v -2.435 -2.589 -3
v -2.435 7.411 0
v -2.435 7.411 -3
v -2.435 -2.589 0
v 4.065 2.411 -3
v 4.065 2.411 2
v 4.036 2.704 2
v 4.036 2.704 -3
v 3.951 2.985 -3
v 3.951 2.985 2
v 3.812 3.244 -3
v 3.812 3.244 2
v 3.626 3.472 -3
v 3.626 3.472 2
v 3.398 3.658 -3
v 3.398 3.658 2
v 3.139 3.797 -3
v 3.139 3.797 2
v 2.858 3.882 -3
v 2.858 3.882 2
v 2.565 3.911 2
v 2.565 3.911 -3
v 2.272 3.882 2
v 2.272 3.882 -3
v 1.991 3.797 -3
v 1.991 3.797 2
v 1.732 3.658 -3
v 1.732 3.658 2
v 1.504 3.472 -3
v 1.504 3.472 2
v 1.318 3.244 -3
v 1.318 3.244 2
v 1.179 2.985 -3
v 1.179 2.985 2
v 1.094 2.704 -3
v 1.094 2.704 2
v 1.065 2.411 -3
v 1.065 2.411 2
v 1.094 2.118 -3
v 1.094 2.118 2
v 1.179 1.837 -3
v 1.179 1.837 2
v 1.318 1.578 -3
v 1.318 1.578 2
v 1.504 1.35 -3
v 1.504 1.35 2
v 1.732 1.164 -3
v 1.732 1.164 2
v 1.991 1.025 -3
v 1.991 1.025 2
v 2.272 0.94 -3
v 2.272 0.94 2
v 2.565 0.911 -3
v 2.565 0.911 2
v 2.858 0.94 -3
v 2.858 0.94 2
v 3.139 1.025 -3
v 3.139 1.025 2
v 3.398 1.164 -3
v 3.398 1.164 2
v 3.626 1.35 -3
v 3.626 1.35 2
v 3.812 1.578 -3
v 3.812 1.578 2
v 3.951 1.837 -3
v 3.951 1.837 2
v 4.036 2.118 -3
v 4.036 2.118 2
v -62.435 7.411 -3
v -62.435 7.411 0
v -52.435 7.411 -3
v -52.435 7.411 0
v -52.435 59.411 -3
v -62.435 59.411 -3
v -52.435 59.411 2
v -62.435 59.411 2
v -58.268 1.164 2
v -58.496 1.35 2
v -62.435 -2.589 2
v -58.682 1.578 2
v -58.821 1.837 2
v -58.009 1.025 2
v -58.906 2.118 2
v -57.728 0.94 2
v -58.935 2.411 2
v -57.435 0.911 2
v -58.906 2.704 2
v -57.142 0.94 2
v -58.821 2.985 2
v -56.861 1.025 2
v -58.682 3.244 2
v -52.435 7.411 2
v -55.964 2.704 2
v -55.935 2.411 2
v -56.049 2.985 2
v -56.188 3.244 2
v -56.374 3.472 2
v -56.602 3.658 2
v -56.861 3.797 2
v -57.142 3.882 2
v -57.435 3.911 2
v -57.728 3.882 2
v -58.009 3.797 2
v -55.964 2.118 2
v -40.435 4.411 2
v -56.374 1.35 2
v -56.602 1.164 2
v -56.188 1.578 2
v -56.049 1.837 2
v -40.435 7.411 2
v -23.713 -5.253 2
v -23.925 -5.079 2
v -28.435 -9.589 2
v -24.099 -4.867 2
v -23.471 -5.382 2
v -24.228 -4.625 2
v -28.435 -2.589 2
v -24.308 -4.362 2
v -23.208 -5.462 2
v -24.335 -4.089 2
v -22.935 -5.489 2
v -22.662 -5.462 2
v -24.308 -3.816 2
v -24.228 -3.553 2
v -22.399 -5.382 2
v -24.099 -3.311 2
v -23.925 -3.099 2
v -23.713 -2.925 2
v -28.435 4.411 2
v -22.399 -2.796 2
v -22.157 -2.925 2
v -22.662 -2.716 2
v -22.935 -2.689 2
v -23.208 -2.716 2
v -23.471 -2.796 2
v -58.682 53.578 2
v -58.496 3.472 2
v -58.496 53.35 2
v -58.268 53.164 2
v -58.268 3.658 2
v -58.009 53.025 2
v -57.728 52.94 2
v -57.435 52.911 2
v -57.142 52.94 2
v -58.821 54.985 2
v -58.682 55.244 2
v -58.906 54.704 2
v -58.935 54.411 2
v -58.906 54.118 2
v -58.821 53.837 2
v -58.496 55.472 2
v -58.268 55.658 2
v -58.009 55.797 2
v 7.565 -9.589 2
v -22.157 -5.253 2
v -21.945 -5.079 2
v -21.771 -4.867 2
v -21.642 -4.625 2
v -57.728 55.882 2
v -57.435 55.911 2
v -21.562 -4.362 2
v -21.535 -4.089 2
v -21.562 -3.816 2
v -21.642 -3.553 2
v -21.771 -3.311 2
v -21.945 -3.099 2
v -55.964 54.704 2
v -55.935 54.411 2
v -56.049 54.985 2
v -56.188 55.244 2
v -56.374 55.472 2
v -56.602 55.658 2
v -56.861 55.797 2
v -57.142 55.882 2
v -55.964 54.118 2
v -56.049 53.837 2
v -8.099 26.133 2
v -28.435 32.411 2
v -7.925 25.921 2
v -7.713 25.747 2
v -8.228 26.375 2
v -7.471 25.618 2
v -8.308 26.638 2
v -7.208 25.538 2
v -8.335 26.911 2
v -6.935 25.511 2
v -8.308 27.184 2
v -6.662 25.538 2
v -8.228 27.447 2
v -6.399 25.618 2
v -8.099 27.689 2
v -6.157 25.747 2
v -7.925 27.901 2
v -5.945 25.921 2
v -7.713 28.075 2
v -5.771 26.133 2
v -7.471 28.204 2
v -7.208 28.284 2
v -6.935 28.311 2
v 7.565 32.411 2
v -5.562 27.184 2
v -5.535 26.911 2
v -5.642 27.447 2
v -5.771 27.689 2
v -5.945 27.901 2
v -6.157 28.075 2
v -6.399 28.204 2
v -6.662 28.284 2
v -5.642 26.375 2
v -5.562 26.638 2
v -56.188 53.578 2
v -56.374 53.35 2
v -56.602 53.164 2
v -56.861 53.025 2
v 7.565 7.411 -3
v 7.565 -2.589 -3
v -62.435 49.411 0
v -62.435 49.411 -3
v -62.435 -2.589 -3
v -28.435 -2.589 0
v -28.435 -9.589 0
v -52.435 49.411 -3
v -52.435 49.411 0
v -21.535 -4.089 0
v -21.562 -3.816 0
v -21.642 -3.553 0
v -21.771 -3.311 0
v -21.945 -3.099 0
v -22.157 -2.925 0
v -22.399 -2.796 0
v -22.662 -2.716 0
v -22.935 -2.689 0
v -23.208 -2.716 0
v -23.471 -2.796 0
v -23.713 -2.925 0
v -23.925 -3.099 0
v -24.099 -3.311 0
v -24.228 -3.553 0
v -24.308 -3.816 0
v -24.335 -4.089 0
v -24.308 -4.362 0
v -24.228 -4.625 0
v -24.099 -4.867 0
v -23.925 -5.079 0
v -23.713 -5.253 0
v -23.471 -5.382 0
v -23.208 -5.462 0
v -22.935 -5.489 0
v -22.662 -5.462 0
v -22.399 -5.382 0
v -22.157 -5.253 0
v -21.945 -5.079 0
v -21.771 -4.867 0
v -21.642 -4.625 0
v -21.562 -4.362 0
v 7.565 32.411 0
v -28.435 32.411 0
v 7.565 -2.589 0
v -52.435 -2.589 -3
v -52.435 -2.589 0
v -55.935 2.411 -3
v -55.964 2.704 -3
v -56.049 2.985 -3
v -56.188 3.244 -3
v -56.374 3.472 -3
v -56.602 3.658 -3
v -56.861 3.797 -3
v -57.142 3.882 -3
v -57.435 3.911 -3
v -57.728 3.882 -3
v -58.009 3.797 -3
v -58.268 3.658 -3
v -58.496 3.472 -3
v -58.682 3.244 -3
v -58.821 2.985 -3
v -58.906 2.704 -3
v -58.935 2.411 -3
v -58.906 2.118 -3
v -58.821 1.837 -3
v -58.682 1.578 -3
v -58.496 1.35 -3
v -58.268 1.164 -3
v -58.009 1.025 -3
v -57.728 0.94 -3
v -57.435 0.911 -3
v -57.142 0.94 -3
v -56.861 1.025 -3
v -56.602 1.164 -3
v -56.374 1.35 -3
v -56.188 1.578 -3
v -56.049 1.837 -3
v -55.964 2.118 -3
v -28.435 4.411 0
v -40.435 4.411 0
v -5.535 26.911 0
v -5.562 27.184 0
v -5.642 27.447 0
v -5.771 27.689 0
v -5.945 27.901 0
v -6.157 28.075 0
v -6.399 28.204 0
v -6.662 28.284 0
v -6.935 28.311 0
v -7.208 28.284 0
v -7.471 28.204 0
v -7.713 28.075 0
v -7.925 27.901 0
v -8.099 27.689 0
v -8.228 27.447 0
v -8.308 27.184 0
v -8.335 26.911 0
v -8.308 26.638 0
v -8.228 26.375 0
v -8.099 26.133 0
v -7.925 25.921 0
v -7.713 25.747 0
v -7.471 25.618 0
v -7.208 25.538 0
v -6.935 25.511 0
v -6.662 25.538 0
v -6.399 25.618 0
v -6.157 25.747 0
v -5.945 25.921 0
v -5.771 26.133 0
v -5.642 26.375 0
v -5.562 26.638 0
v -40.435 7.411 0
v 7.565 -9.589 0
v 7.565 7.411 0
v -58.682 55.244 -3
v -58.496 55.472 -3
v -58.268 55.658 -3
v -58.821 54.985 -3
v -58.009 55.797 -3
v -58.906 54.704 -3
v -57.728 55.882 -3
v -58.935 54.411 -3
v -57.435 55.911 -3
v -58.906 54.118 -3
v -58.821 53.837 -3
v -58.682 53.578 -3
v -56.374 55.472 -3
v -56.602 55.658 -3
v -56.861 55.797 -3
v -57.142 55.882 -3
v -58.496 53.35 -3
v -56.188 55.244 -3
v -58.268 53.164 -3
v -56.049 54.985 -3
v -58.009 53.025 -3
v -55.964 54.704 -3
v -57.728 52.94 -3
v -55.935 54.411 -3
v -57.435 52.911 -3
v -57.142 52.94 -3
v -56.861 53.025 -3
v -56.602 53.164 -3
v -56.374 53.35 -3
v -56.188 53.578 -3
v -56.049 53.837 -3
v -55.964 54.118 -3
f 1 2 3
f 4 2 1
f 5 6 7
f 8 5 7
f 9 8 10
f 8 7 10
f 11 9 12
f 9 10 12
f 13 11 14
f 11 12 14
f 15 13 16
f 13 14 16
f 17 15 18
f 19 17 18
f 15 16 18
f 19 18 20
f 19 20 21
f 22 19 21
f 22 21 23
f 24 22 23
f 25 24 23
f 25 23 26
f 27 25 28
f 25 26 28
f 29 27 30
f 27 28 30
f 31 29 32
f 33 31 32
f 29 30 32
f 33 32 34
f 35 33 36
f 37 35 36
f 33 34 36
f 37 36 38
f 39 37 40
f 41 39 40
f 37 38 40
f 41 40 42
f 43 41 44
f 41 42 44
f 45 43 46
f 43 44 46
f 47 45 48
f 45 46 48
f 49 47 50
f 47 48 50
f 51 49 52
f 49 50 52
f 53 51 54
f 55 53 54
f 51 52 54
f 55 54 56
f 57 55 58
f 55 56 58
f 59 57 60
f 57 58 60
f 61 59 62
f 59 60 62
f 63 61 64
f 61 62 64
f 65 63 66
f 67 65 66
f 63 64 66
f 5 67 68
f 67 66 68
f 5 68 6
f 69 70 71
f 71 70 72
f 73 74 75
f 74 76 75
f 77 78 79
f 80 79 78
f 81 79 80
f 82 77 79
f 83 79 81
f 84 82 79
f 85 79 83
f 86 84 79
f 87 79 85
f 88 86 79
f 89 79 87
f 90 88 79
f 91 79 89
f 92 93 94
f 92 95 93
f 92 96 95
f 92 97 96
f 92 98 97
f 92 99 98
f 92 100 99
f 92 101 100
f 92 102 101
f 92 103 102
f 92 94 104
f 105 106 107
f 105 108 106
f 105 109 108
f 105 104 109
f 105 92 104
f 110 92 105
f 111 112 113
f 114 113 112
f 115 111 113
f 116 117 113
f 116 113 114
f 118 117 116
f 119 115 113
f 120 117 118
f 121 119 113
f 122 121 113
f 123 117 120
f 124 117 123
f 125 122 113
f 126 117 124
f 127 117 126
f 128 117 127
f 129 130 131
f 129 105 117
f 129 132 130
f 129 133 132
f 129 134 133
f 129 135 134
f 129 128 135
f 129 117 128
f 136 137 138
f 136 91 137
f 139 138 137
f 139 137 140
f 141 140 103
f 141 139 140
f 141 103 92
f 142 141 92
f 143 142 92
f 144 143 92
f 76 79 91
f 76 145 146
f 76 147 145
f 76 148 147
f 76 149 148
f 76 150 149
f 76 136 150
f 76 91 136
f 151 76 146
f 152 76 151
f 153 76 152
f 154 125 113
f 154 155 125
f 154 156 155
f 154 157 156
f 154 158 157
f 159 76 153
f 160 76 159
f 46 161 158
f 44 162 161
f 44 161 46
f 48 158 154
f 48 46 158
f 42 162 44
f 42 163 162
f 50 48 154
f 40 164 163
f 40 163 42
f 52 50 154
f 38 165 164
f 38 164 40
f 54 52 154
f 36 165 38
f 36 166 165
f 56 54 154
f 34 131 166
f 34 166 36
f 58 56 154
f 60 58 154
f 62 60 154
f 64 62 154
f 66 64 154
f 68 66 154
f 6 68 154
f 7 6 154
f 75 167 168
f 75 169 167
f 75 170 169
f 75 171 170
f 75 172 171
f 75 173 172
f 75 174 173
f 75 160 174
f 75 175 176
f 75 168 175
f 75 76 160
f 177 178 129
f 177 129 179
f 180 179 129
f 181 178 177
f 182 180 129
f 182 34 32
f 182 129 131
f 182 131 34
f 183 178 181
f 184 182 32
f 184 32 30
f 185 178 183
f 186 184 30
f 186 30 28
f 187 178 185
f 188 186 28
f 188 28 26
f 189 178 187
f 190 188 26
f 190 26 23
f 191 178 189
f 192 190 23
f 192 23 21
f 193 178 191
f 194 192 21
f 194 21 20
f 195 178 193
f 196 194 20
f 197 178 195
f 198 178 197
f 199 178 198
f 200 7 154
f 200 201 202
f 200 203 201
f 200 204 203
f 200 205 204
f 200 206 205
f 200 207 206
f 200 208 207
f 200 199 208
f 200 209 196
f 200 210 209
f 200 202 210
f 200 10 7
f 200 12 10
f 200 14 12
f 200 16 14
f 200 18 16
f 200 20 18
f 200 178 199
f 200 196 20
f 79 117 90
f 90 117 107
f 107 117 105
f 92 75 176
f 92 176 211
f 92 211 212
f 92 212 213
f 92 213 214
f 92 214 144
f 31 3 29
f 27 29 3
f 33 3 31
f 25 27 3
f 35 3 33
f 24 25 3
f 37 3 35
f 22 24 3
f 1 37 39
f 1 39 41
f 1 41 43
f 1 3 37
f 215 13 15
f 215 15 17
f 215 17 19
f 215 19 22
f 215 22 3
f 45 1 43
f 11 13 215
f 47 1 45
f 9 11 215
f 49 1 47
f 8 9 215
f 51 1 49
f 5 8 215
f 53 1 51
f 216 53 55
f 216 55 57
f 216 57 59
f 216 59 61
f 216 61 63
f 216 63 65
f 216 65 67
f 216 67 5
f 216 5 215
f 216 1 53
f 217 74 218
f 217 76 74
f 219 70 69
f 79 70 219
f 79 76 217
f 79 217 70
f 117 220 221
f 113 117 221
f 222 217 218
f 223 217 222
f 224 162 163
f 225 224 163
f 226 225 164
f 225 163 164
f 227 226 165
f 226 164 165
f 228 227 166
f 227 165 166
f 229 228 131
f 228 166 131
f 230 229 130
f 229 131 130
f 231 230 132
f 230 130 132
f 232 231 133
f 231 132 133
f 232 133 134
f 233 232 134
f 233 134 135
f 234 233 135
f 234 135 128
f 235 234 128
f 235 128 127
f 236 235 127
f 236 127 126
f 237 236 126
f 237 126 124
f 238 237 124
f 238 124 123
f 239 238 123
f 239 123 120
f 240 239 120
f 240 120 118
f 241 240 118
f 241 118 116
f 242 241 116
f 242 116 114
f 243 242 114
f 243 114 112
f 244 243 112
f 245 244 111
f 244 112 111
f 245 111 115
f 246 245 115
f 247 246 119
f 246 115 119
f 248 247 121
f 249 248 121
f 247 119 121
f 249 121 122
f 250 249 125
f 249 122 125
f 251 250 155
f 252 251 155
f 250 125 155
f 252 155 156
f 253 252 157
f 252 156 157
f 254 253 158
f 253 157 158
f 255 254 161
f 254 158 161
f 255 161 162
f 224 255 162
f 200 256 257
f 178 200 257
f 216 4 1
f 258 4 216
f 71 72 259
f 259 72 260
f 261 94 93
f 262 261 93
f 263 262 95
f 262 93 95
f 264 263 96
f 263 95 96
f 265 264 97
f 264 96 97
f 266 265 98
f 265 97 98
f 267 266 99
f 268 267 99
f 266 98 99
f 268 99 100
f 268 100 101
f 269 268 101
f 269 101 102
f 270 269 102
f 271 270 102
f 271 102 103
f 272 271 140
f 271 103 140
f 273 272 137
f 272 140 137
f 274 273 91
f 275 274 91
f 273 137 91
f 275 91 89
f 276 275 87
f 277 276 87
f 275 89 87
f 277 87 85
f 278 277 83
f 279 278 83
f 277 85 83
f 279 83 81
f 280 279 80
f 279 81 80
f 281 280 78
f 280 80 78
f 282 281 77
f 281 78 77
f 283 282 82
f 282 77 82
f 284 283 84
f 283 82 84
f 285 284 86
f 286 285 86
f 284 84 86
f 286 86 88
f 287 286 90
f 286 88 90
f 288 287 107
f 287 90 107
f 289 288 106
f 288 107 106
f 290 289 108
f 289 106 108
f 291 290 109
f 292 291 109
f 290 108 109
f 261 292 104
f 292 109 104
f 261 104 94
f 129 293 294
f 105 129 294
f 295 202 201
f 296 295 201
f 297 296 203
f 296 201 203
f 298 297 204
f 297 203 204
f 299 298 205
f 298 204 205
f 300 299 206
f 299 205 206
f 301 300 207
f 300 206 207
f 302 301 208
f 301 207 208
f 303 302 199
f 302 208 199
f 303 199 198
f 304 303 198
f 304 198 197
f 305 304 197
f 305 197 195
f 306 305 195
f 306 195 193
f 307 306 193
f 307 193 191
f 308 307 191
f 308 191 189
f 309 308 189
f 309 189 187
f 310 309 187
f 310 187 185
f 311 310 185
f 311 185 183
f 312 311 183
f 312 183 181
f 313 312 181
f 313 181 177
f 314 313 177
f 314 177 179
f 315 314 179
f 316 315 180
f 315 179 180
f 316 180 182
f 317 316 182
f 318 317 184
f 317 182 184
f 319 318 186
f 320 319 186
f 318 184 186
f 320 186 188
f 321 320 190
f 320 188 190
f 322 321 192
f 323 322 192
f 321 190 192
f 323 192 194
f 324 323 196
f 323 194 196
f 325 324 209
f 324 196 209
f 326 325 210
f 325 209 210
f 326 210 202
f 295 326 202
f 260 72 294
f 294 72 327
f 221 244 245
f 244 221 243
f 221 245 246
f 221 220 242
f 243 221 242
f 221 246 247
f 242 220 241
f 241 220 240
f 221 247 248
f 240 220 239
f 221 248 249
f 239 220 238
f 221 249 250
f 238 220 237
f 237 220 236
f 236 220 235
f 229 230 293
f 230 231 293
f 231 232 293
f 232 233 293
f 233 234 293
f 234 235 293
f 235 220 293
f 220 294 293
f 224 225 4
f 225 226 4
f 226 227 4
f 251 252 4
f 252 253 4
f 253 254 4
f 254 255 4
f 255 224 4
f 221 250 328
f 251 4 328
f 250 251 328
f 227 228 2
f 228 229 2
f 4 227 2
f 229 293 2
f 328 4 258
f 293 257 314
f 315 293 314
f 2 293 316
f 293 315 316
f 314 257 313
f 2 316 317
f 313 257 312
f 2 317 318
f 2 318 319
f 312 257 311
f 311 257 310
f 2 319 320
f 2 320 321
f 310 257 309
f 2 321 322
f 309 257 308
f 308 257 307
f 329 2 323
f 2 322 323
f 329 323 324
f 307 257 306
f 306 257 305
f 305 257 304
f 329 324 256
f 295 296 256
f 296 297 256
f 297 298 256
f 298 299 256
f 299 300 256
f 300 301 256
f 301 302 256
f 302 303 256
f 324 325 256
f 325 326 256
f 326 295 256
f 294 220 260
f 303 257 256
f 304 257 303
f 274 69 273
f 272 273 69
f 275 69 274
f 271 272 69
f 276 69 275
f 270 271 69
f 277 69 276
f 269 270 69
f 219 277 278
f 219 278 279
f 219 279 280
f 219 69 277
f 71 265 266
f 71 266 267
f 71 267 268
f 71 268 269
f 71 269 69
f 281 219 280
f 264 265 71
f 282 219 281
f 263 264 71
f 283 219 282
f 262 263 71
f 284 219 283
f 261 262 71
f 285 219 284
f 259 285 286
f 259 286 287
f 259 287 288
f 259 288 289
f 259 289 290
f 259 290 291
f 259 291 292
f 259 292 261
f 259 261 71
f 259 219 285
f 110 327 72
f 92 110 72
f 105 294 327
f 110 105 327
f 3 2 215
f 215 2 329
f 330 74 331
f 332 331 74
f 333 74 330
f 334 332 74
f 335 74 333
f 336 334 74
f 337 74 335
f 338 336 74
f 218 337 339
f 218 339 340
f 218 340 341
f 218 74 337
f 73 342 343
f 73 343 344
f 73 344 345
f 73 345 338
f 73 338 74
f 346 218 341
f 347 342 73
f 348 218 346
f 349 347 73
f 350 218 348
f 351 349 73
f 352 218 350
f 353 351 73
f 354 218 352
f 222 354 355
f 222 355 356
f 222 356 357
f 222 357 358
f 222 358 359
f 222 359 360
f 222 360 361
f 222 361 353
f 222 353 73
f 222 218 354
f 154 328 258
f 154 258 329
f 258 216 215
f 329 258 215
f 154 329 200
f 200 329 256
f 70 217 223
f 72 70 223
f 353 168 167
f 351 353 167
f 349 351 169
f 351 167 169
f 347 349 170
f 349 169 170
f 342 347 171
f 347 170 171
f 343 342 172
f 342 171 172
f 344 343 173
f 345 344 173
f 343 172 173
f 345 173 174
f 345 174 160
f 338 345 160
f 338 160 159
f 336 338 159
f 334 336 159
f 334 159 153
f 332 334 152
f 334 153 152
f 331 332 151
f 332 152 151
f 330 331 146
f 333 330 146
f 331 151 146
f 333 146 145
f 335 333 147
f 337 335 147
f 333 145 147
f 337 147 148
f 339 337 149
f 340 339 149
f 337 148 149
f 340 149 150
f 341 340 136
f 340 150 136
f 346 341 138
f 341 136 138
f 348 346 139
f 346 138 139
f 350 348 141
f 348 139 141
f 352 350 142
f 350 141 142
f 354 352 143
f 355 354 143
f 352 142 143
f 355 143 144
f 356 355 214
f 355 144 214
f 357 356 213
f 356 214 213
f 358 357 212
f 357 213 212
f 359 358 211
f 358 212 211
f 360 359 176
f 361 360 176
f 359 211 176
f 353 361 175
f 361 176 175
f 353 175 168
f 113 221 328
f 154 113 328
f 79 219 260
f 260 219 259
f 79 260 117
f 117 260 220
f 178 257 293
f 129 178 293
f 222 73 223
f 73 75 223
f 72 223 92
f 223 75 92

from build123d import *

# Parameters (mm, degrees)
F1_DEPTH = 2
F2_W     = 10
F2_H     = 10
F3_DEPTH = 3
F4_R     = 1.5
F4_R_2   = 1.4
F5_DEPTH = 5


with BuildPart() as f1:
    # F0 (on Top) → F1 (new body)
    with BuildSketch(Plane.XY):
        Polygon((-52.435034, 59.411056), (-62.435034, 59.411056), (-62.435034, -2.588944), (-28.435034, -2.588944), (-28.435034, -9.588944), (7.564966, -9.588944), (7.564966, 32.411056), (-28.435034, 32.411056), (-28.435034, 4.411056), (-40.435034, 4.411056), (-40.435034, 7.411056), (-52.435034, 7.411056), align=None)
    extrude(amount=F1_DEPTH)

    # F2 (on face) → F3 (join)
    with BuildSketch(Plane(origin=(0, 0, 0), x_dir=(1, 0, 0), z_dir=(0, 0, -1))):
        with Locations((-57.435034, -54.411056)):
            Rectangle(F2_W, F2_H)
        with Locations((-57.435034, -2.411056)):
            Rectangle(F2_W, F2_H)
        with Locations((2.564966, -2.411056)):
            Rectangle(F2_W, F2_H)
    extrude(amount=F3_DEPTH)

    # F4 (on face) → F5 (cut)
    with BuildSketch(Plane.XY.offset(2)):
        with Locations((-57.435034, 54.411056)):
            Circle(F4_R)
        with Locations((-57.435034, 2.411056)):
            Circle(F4_R)
        with Locations((2.564966, 2.411056)):
            Circle(F4_R)
        with Locations((-6.935034, 26.911056)):
            Circle(F4_R_2)
        with Locations((-22.935034, -4.088944)):
            Circle(F4_R_2)
    extrude(amount=-F5_DEPTH, mode=Mode.SUBTRACT)


solid = f1.part
